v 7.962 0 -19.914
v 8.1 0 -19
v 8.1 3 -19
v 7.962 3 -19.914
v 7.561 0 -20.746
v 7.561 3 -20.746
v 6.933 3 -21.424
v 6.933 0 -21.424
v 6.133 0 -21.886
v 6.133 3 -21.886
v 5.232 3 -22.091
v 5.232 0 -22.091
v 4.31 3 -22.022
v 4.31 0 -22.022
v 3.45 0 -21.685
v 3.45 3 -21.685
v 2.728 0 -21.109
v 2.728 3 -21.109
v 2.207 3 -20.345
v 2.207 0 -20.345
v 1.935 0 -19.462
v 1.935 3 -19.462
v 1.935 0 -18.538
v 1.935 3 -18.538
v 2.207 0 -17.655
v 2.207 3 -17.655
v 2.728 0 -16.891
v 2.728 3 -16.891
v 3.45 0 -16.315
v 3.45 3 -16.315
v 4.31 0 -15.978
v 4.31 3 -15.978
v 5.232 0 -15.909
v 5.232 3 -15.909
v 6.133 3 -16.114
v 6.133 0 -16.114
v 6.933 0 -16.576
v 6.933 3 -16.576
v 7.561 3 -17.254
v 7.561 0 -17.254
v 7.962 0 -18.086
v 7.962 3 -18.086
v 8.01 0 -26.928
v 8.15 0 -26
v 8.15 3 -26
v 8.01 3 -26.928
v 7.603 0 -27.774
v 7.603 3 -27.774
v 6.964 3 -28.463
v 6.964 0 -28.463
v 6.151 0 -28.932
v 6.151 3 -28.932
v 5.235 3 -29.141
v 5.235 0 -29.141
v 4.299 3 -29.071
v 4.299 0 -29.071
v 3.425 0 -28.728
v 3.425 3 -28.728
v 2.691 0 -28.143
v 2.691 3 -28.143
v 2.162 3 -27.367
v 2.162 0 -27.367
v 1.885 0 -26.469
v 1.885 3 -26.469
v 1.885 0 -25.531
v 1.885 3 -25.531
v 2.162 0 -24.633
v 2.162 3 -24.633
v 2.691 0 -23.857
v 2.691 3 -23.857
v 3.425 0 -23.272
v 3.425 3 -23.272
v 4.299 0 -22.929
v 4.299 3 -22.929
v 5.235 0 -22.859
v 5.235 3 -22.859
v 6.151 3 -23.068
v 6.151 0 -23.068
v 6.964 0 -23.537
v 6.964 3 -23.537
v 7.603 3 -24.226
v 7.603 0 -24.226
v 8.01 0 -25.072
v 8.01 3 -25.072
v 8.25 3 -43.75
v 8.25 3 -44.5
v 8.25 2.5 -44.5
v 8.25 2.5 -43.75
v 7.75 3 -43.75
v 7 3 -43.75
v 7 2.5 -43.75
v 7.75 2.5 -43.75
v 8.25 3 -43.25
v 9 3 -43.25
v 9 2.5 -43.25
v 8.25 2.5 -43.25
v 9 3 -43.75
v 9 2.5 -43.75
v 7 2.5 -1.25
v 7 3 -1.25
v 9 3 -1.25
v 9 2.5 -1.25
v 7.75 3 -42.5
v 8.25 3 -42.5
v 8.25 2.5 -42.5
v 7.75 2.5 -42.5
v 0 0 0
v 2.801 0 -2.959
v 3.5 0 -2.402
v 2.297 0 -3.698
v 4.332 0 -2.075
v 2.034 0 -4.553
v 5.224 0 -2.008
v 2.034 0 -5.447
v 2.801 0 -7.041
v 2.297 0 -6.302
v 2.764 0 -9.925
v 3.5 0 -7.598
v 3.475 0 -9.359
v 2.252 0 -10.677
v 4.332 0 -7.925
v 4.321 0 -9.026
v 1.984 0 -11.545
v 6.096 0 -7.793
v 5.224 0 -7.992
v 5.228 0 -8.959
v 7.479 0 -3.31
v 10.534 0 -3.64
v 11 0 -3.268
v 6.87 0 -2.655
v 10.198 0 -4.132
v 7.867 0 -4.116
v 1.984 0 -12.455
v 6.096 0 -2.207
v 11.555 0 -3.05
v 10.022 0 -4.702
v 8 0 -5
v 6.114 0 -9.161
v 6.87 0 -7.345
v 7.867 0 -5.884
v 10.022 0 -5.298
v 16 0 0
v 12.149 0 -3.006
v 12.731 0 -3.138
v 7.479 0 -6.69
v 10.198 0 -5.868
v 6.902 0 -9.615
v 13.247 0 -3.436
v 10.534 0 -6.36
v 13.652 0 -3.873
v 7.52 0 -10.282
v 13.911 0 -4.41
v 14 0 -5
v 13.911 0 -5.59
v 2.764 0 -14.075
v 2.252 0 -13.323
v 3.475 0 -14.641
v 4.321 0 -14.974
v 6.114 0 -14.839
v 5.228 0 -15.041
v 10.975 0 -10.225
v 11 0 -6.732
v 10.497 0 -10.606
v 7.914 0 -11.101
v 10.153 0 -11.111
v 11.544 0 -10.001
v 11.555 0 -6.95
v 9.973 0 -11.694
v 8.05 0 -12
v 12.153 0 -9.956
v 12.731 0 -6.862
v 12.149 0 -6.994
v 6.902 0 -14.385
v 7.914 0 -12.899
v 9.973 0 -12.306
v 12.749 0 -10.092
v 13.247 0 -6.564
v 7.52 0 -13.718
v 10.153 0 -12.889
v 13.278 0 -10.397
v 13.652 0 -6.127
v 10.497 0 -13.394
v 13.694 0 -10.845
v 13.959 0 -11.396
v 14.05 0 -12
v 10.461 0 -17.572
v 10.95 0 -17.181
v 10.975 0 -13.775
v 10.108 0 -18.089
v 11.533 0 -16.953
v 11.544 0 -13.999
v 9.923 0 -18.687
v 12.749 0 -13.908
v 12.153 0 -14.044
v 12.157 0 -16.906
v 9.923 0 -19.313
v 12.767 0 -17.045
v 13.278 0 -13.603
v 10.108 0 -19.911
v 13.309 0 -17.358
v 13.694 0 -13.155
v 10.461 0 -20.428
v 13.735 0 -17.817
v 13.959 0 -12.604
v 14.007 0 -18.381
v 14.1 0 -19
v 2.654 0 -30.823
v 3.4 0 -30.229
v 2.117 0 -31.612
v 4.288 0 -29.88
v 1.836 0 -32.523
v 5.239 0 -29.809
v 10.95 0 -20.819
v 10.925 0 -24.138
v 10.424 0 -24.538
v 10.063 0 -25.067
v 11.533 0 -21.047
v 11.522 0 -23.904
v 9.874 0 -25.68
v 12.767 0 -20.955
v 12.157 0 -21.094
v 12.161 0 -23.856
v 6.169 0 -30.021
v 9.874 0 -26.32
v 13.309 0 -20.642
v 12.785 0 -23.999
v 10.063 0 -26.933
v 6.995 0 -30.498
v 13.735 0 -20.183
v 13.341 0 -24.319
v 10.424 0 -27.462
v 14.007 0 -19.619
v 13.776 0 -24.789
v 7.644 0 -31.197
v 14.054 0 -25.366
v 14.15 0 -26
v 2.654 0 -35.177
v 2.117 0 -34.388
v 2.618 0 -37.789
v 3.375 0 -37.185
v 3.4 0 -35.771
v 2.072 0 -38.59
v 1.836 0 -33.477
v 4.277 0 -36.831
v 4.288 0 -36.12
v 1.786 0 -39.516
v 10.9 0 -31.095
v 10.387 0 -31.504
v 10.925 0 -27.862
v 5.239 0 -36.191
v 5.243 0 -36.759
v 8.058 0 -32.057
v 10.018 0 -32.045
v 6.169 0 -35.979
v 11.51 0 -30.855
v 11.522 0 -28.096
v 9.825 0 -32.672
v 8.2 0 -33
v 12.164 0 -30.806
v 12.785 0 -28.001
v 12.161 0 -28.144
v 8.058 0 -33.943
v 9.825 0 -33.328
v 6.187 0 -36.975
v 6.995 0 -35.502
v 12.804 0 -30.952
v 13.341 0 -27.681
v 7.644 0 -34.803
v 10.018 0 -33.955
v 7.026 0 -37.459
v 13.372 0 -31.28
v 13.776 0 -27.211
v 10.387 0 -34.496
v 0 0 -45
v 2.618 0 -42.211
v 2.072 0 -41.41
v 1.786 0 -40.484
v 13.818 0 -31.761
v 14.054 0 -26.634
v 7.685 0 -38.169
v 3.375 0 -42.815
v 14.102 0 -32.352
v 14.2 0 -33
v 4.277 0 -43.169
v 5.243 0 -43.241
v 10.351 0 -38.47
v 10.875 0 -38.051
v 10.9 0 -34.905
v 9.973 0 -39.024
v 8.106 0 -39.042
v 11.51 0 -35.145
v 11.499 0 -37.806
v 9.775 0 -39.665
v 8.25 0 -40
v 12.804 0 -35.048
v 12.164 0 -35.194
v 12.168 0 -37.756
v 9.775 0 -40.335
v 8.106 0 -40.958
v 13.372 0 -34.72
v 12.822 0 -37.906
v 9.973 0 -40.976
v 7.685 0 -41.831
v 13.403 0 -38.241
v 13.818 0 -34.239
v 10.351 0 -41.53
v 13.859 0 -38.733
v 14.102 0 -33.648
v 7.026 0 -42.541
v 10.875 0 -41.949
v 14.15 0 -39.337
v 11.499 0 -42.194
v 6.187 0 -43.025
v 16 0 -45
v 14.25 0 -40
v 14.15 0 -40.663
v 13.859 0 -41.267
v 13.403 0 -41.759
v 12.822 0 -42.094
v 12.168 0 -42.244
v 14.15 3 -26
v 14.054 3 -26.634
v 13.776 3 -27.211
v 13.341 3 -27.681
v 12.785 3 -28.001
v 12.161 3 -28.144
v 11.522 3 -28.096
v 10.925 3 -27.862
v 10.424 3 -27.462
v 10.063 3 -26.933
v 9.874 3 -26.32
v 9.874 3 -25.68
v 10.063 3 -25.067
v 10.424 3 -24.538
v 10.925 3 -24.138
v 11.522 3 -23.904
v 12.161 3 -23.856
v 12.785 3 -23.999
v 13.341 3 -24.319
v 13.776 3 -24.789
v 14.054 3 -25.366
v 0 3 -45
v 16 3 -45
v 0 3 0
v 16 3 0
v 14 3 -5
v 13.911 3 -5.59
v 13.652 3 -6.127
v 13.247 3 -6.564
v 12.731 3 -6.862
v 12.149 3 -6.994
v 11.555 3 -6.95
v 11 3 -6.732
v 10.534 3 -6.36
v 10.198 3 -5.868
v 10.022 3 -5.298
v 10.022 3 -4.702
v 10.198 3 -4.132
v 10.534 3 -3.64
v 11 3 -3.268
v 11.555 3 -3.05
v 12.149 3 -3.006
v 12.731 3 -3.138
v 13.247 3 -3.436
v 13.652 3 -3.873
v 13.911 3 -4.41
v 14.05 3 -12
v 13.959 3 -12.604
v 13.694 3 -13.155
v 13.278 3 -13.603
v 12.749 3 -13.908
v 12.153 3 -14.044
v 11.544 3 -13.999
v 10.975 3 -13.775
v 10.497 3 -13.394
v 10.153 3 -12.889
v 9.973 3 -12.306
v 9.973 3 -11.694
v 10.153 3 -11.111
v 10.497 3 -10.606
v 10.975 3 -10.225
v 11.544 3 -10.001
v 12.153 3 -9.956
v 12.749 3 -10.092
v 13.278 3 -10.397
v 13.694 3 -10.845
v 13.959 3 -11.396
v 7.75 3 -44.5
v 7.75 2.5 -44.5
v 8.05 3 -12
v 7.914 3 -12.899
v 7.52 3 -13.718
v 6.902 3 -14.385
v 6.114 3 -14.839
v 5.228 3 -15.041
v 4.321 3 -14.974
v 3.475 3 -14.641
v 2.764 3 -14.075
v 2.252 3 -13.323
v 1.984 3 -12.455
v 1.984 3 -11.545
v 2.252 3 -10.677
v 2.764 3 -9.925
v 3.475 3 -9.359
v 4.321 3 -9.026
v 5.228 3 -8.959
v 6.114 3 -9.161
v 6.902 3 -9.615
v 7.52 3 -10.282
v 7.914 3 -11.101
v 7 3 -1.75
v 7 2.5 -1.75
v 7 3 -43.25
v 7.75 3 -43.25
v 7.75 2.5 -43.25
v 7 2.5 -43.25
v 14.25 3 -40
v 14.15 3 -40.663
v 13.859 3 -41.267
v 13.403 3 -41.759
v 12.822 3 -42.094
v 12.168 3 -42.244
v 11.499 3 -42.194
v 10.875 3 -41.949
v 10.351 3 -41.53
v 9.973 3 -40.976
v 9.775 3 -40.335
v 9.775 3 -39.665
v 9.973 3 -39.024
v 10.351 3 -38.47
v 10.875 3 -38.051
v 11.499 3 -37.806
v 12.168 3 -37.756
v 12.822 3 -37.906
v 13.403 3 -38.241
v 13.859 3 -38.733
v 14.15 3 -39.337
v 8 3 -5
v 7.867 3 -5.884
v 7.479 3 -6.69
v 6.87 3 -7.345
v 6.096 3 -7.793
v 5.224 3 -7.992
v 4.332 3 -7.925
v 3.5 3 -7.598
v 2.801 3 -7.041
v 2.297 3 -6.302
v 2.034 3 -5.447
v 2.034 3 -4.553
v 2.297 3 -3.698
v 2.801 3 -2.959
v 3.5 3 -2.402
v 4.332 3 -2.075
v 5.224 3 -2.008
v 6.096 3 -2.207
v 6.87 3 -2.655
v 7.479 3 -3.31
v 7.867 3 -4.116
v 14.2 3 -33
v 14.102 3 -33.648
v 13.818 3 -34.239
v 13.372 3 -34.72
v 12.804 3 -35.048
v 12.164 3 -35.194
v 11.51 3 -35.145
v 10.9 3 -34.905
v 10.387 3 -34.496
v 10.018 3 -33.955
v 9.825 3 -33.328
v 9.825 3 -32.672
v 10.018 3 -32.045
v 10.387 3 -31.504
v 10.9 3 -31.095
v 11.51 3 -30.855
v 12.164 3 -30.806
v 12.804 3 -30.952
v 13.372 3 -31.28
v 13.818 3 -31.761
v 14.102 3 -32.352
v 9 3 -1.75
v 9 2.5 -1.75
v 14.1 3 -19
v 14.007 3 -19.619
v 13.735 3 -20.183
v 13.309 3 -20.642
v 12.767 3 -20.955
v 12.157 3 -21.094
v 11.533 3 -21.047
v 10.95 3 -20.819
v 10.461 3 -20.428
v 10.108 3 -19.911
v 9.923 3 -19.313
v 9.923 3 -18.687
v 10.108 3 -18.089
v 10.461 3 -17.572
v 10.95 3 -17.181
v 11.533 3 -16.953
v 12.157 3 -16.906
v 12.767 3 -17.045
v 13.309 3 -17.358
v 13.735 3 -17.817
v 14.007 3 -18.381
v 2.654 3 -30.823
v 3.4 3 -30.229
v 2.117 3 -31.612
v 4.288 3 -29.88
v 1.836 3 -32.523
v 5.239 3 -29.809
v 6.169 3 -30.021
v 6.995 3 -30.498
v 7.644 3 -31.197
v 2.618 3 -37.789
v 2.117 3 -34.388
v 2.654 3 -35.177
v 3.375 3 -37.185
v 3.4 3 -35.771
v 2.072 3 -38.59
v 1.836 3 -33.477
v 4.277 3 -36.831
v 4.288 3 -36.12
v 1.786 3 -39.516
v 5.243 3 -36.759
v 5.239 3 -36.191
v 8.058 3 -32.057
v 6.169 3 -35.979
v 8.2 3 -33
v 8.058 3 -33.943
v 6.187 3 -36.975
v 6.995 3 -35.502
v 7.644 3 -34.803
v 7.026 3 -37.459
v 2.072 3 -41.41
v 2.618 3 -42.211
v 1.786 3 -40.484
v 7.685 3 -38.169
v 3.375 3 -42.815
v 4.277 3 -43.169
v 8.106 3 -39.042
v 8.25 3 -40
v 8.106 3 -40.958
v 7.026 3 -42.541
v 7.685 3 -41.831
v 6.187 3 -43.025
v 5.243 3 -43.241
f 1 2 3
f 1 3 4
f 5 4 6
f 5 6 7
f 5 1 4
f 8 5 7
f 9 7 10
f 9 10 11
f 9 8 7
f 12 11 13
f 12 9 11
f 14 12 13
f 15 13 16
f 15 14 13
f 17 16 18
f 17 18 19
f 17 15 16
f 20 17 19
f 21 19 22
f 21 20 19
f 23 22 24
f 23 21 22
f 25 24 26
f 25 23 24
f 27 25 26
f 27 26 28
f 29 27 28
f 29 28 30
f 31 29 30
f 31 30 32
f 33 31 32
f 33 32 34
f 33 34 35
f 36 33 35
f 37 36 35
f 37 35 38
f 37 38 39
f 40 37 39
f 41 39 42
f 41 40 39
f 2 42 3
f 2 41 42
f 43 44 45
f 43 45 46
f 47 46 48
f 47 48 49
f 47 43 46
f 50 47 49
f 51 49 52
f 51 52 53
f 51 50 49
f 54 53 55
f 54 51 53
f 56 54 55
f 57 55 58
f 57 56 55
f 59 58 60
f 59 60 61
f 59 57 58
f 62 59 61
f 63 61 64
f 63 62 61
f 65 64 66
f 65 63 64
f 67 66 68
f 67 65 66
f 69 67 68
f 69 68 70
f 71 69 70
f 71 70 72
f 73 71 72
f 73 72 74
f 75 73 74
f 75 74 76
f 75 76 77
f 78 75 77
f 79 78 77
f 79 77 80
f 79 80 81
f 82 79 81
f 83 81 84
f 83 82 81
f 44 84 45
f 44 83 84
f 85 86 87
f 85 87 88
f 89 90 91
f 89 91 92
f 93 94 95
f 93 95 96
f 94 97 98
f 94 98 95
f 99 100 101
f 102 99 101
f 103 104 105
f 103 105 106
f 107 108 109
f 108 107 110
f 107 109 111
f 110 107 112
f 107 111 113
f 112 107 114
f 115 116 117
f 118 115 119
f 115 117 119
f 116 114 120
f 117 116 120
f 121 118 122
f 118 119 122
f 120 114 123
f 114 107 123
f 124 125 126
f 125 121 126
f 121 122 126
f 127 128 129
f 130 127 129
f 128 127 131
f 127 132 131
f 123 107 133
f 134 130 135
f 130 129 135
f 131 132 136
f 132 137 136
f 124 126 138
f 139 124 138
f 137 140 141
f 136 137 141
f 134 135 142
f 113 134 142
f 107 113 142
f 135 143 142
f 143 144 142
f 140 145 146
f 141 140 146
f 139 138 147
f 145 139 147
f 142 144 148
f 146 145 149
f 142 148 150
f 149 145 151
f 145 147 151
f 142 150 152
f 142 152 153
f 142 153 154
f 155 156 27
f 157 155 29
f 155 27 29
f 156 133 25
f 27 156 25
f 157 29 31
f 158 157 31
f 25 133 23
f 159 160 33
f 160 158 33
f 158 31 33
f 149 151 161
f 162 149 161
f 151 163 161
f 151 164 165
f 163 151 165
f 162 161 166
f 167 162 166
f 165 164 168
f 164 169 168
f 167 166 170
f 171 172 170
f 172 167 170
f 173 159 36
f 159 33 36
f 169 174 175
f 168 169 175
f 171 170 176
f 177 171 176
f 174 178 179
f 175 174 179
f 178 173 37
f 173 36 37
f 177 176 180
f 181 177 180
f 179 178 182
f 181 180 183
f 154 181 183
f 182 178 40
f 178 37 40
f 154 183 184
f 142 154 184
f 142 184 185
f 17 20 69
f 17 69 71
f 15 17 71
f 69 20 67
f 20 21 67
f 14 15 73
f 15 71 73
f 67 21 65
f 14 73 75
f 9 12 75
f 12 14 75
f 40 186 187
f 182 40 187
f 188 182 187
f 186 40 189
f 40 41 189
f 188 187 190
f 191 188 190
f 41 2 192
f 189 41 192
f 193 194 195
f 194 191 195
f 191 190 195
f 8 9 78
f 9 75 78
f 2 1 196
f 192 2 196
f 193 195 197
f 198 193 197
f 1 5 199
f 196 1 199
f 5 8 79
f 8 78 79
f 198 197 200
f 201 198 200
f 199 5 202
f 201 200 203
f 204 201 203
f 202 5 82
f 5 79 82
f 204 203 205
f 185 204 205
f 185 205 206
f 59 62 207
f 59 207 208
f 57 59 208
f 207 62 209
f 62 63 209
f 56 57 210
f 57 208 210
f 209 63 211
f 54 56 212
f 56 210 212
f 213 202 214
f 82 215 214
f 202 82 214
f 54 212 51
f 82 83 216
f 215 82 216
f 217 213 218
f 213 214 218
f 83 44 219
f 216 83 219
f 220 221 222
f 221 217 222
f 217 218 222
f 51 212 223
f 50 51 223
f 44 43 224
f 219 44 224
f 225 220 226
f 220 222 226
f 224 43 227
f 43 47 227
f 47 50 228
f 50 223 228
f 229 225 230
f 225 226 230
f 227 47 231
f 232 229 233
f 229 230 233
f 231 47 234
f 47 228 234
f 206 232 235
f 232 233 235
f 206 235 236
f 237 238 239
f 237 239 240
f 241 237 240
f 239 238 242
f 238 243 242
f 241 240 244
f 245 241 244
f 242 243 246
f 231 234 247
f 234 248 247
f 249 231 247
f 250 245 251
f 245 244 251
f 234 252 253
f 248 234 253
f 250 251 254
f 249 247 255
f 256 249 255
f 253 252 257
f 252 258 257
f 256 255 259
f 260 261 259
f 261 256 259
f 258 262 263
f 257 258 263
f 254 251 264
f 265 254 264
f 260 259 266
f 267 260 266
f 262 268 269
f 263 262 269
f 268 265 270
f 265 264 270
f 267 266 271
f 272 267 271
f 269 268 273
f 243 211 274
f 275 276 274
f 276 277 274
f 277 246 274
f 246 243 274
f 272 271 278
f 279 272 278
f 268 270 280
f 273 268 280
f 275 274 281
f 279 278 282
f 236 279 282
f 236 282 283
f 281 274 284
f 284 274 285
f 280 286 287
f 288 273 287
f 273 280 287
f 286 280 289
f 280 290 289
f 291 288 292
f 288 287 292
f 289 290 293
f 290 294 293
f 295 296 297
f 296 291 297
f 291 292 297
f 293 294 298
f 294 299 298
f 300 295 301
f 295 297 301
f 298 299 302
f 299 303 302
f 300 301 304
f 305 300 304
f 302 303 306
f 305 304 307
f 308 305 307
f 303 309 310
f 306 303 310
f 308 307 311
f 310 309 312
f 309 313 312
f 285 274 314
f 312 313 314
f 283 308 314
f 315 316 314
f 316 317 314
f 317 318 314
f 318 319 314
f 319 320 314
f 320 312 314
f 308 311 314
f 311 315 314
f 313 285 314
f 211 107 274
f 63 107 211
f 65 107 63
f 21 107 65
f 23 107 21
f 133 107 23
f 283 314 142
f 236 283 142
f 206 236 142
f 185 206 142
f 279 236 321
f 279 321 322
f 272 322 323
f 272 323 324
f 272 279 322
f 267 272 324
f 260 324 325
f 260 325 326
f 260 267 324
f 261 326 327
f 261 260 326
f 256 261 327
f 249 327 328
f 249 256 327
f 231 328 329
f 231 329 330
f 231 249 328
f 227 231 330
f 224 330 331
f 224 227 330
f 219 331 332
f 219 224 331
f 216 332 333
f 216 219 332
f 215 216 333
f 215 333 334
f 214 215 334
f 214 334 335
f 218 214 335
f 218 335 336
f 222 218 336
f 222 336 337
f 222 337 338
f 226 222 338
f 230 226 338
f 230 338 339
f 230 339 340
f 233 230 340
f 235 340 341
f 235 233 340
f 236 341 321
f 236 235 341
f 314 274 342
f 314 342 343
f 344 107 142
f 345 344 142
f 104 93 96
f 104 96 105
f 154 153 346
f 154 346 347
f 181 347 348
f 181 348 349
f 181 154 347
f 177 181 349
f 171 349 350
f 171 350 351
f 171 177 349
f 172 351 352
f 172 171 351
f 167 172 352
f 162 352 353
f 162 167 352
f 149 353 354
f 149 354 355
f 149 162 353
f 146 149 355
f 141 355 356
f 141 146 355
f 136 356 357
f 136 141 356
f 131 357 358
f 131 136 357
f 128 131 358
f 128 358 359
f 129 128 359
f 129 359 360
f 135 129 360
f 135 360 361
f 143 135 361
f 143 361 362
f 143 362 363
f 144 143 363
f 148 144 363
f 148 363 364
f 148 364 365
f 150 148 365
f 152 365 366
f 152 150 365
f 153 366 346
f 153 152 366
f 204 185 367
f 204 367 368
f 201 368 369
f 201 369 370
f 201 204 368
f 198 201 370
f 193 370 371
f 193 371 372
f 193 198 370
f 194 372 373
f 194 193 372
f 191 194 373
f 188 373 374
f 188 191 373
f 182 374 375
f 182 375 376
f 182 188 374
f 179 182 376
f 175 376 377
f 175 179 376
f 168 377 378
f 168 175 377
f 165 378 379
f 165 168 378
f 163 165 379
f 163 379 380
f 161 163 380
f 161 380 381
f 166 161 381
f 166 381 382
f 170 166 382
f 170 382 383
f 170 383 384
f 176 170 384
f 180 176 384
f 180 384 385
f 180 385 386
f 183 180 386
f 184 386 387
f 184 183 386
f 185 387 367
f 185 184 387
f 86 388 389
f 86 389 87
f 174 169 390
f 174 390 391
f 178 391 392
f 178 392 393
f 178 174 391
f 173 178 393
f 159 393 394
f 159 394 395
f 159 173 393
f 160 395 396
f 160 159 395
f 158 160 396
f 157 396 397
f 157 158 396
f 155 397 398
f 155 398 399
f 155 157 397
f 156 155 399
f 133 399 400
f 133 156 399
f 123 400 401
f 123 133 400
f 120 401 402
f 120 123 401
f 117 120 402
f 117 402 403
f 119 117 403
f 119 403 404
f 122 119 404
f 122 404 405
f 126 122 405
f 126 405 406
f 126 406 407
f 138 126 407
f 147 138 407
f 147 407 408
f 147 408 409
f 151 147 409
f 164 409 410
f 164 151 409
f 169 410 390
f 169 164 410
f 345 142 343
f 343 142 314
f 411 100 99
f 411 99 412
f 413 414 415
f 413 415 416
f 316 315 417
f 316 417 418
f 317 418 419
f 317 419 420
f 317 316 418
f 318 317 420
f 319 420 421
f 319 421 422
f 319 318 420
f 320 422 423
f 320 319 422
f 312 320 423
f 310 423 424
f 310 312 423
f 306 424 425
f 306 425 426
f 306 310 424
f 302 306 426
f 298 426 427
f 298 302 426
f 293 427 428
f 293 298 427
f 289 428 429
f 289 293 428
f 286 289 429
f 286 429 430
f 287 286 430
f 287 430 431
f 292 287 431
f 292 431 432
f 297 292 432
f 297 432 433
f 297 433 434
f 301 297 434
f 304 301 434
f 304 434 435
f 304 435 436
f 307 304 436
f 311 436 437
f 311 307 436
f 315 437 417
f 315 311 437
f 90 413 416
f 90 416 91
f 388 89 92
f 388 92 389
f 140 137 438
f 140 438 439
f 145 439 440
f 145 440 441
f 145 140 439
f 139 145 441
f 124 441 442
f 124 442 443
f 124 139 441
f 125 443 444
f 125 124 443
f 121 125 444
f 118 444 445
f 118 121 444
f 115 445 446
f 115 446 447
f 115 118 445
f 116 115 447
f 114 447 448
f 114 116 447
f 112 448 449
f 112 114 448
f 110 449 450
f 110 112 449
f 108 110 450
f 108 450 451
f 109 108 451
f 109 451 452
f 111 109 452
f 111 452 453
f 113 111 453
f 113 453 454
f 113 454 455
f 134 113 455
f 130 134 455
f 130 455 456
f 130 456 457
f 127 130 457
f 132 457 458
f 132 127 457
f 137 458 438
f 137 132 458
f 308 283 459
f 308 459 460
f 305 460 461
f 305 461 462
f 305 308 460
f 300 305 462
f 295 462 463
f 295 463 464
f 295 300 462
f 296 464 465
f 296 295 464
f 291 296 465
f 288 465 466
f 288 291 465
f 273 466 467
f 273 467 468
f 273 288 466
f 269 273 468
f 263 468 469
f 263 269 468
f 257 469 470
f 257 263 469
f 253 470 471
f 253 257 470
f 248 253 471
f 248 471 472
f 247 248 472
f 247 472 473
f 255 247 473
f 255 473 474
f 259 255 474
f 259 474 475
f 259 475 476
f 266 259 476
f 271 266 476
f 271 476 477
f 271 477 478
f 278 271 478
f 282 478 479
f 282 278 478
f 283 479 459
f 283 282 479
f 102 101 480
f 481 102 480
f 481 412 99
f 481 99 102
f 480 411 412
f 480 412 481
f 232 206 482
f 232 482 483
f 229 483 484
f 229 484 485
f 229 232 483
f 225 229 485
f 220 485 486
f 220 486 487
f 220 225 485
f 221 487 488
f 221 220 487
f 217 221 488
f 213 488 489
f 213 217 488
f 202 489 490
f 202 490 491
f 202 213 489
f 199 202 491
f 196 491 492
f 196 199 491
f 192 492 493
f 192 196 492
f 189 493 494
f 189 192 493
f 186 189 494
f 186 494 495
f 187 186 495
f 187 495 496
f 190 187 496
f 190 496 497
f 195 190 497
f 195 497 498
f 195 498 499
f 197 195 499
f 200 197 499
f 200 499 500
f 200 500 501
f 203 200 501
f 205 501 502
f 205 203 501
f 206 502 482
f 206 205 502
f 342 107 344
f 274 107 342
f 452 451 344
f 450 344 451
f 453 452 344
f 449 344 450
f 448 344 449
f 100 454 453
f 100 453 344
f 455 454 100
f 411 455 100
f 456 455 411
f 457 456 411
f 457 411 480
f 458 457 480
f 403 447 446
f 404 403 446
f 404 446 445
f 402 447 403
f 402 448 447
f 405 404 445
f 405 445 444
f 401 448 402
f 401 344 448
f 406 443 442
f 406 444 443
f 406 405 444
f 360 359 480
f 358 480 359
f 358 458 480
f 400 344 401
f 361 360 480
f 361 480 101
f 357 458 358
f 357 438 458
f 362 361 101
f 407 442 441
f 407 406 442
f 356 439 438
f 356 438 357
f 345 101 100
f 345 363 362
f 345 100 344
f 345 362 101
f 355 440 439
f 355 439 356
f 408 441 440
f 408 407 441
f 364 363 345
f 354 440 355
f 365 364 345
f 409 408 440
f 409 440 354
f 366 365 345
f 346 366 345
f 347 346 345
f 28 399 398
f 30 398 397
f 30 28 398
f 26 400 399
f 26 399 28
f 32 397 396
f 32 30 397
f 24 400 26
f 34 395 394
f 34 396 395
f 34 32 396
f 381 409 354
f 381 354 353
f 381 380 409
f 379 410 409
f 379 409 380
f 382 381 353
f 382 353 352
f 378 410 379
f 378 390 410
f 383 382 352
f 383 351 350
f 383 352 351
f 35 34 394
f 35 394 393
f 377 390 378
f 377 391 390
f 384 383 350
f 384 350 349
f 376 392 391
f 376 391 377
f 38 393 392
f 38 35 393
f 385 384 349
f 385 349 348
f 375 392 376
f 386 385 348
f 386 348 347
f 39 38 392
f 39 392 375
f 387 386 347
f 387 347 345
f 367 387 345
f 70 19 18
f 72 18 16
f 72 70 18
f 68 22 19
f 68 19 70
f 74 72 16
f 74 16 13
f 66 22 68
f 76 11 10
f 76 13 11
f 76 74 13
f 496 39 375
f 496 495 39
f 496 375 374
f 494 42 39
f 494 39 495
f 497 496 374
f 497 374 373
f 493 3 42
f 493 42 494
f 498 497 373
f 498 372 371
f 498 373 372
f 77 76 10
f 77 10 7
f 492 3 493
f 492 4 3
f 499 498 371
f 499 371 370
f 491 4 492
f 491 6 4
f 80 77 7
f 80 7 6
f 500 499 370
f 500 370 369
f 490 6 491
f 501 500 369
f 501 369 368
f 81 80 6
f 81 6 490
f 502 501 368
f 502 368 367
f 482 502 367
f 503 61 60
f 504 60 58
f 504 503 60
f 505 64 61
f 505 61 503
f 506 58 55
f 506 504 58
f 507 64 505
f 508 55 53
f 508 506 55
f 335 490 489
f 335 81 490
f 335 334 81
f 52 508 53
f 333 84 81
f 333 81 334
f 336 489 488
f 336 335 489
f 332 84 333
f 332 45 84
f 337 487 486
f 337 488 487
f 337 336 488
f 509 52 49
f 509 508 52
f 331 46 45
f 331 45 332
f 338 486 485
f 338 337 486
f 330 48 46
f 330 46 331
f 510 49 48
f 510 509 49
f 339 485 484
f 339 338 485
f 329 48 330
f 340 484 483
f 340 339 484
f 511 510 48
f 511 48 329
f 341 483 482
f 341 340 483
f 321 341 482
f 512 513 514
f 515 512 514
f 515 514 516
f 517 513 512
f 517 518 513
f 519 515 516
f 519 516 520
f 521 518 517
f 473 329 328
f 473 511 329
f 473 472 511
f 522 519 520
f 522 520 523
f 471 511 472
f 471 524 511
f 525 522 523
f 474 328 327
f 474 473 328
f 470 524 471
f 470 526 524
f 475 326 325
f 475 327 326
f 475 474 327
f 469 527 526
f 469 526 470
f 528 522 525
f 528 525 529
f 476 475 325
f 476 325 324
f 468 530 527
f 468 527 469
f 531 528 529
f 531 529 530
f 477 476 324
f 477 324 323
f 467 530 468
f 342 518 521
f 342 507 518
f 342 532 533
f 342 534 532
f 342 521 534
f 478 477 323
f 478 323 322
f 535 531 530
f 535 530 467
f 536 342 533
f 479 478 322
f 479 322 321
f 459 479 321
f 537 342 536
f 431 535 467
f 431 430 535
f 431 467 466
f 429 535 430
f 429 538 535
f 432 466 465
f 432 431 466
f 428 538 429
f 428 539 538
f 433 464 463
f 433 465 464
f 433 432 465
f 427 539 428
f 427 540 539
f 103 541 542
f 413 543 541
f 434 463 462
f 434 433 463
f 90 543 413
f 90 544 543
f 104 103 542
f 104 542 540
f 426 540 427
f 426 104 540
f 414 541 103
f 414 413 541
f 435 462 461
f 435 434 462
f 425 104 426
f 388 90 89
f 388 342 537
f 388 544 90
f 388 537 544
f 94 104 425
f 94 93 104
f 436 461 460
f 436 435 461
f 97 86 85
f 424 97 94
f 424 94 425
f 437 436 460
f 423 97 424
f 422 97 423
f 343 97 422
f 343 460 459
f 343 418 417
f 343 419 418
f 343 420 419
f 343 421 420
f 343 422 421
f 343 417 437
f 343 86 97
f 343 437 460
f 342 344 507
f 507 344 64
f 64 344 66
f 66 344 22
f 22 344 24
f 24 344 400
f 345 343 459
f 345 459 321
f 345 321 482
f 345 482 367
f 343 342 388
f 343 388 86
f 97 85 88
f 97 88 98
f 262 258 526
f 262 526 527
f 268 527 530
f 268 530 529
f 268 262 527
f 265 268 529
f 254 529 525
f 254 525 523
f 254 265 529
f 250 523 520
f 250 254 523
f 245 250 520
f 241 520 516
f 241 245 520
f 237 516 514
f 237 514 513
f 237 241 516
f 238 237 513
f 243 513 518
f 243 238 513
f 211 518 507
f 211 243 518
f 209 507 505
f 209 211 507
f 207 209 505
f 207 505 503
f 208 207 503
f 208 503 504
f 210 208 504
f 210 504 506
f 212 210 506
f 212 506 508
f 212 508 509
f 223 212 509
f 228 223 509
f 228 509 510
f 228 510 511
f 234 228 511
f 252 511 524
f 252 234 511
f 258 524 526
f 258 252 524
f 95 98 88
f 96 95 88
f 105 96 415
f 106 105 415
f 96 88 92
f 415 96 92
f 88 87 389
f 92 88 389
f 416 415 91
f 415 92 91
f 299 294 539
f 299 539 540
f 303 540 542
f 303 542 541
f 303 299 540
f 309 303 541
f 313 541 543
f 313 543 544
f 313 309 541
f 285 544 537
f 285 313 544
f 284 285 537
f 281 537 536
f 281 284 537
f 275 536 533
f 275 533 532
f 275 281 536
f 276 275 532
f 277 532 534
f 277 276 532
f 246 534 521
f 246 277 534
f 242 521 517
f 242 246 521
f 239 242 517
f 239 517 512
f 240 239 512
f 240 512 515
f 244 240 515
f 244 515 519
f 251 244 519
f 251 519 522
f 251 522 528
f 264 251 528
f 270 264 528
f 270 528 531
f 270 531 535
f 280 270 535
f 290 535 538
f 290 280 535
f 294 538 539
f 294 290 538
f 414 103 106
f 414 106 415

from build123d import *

# Parameters (mm, degrees)
SKETCH1_W           = 16
SKETCH1_H           = 45
SKETCH1_R           = 3
SKETCH1_R_2         = 3.05
SKETCH1_R_3         = 3.1
SKETCH1_R_4         = 3.15
SKETCH1_R_5         = 3.2
SKETCH1_R_6         = 3.25
SKETCH1_R_7         = 2.25
SKETCH1_R_8         = 2.2
SKETCH1_R_9         = 2.15
SKETCH1_R_10        = 2.1
SKETCH1_R_11        = 2.05
SKETCH1_R_12        = 2
BOSS_EXTRUDE1_DEPTH = 3
SKETCH2_W           = 2
SKETCH2_H           = 0.5
CUT_EXTRUDE1_DEPTH  = 0.5


with BuildPart() as part:
    # Sketch1 → Boss-Extrude1 (new body)
    with BuildSketch(Plane(origin=(0, 0, 0), x_dir=(1, 0, 0), z_dir=(0, 1, 0))):
        with Locations((8, 22.5)):
            Rectangle(SKETCH1_W, SKETCH1_H)
        with Locations((5, 5)):
            Circle(SKETCH1_R, mode=Mode.SUBTRACT)
        with Locations((5, 12)):
            Circle(SKETCH1_R_2, mode=Mode.SUBTRACT)
        with Locations((5, 19)):
            Circle(SKETCH1_R_3, mode=Mode.SUBTRACT)
        with Locations((5, 26)):
            Circle(SKETCH1_R_4, mode=Mode.SUBTRACT)
        with Locations((5, 33)):
            Circle(SKETCH1_R_5, mode=Mode.SUBTRACT)
        with Locations((5, 40)):
            Circle(SKETCH1_R_6, mode=Mode.SUBTRACT)
        with Locations((12, 40)):
            Circle(SKETCH1_R_7, mode=Mode.SUBTRACT)
        with Locations((12, 33)):
            Circle(SKETCH1_R_8, mode=Mode.SUBTRACT)
        with Locations((12, 26)):
            Circle(SKETCH1_R_9, mode=Mode.SUBTRACT)
        with Locations((12, 19)):
            Circle(SKETCH1_R_10, mode=Mode.SUBTRACT)
        with Locations((12, 12)):
            Circle(SKETCH1_R_11, mode=Mode.SUBTRACT)
        with Locations((12, 5)):
            Circle(SKETCH1_R_12, mode=Mode.SUBTRACT)
    extrude(amount=BOSS_EXTRUDE1_DEPTH)

    # Sketch2 → Cut-Extrude1 (cut)
    with BuildSketch(Plane(origin=(0, 3, 0), x_dir=(1, 0, 0), z_dir=(0, 1, 0))):
        Polygon((7.75, 43.75), (7.75, 44.5), (8.25, 44.5), (8.25, 43.75), (9, 43.75), (9, 43.25), (8.25, 43.25), (8.25, 42.5), (7.75, 42.5), (7.75, 43.25), (7, 43.25), (7, 43.75), align=None)
        with Locations((8, 1.5)):
            Rectangle(SKETCH2_W, SKETCH2_H)
    extrude(amount=-CUT_EXTRUDE1_DEPTH, mode=Mode.SUBTRACT)


solid = part.part
